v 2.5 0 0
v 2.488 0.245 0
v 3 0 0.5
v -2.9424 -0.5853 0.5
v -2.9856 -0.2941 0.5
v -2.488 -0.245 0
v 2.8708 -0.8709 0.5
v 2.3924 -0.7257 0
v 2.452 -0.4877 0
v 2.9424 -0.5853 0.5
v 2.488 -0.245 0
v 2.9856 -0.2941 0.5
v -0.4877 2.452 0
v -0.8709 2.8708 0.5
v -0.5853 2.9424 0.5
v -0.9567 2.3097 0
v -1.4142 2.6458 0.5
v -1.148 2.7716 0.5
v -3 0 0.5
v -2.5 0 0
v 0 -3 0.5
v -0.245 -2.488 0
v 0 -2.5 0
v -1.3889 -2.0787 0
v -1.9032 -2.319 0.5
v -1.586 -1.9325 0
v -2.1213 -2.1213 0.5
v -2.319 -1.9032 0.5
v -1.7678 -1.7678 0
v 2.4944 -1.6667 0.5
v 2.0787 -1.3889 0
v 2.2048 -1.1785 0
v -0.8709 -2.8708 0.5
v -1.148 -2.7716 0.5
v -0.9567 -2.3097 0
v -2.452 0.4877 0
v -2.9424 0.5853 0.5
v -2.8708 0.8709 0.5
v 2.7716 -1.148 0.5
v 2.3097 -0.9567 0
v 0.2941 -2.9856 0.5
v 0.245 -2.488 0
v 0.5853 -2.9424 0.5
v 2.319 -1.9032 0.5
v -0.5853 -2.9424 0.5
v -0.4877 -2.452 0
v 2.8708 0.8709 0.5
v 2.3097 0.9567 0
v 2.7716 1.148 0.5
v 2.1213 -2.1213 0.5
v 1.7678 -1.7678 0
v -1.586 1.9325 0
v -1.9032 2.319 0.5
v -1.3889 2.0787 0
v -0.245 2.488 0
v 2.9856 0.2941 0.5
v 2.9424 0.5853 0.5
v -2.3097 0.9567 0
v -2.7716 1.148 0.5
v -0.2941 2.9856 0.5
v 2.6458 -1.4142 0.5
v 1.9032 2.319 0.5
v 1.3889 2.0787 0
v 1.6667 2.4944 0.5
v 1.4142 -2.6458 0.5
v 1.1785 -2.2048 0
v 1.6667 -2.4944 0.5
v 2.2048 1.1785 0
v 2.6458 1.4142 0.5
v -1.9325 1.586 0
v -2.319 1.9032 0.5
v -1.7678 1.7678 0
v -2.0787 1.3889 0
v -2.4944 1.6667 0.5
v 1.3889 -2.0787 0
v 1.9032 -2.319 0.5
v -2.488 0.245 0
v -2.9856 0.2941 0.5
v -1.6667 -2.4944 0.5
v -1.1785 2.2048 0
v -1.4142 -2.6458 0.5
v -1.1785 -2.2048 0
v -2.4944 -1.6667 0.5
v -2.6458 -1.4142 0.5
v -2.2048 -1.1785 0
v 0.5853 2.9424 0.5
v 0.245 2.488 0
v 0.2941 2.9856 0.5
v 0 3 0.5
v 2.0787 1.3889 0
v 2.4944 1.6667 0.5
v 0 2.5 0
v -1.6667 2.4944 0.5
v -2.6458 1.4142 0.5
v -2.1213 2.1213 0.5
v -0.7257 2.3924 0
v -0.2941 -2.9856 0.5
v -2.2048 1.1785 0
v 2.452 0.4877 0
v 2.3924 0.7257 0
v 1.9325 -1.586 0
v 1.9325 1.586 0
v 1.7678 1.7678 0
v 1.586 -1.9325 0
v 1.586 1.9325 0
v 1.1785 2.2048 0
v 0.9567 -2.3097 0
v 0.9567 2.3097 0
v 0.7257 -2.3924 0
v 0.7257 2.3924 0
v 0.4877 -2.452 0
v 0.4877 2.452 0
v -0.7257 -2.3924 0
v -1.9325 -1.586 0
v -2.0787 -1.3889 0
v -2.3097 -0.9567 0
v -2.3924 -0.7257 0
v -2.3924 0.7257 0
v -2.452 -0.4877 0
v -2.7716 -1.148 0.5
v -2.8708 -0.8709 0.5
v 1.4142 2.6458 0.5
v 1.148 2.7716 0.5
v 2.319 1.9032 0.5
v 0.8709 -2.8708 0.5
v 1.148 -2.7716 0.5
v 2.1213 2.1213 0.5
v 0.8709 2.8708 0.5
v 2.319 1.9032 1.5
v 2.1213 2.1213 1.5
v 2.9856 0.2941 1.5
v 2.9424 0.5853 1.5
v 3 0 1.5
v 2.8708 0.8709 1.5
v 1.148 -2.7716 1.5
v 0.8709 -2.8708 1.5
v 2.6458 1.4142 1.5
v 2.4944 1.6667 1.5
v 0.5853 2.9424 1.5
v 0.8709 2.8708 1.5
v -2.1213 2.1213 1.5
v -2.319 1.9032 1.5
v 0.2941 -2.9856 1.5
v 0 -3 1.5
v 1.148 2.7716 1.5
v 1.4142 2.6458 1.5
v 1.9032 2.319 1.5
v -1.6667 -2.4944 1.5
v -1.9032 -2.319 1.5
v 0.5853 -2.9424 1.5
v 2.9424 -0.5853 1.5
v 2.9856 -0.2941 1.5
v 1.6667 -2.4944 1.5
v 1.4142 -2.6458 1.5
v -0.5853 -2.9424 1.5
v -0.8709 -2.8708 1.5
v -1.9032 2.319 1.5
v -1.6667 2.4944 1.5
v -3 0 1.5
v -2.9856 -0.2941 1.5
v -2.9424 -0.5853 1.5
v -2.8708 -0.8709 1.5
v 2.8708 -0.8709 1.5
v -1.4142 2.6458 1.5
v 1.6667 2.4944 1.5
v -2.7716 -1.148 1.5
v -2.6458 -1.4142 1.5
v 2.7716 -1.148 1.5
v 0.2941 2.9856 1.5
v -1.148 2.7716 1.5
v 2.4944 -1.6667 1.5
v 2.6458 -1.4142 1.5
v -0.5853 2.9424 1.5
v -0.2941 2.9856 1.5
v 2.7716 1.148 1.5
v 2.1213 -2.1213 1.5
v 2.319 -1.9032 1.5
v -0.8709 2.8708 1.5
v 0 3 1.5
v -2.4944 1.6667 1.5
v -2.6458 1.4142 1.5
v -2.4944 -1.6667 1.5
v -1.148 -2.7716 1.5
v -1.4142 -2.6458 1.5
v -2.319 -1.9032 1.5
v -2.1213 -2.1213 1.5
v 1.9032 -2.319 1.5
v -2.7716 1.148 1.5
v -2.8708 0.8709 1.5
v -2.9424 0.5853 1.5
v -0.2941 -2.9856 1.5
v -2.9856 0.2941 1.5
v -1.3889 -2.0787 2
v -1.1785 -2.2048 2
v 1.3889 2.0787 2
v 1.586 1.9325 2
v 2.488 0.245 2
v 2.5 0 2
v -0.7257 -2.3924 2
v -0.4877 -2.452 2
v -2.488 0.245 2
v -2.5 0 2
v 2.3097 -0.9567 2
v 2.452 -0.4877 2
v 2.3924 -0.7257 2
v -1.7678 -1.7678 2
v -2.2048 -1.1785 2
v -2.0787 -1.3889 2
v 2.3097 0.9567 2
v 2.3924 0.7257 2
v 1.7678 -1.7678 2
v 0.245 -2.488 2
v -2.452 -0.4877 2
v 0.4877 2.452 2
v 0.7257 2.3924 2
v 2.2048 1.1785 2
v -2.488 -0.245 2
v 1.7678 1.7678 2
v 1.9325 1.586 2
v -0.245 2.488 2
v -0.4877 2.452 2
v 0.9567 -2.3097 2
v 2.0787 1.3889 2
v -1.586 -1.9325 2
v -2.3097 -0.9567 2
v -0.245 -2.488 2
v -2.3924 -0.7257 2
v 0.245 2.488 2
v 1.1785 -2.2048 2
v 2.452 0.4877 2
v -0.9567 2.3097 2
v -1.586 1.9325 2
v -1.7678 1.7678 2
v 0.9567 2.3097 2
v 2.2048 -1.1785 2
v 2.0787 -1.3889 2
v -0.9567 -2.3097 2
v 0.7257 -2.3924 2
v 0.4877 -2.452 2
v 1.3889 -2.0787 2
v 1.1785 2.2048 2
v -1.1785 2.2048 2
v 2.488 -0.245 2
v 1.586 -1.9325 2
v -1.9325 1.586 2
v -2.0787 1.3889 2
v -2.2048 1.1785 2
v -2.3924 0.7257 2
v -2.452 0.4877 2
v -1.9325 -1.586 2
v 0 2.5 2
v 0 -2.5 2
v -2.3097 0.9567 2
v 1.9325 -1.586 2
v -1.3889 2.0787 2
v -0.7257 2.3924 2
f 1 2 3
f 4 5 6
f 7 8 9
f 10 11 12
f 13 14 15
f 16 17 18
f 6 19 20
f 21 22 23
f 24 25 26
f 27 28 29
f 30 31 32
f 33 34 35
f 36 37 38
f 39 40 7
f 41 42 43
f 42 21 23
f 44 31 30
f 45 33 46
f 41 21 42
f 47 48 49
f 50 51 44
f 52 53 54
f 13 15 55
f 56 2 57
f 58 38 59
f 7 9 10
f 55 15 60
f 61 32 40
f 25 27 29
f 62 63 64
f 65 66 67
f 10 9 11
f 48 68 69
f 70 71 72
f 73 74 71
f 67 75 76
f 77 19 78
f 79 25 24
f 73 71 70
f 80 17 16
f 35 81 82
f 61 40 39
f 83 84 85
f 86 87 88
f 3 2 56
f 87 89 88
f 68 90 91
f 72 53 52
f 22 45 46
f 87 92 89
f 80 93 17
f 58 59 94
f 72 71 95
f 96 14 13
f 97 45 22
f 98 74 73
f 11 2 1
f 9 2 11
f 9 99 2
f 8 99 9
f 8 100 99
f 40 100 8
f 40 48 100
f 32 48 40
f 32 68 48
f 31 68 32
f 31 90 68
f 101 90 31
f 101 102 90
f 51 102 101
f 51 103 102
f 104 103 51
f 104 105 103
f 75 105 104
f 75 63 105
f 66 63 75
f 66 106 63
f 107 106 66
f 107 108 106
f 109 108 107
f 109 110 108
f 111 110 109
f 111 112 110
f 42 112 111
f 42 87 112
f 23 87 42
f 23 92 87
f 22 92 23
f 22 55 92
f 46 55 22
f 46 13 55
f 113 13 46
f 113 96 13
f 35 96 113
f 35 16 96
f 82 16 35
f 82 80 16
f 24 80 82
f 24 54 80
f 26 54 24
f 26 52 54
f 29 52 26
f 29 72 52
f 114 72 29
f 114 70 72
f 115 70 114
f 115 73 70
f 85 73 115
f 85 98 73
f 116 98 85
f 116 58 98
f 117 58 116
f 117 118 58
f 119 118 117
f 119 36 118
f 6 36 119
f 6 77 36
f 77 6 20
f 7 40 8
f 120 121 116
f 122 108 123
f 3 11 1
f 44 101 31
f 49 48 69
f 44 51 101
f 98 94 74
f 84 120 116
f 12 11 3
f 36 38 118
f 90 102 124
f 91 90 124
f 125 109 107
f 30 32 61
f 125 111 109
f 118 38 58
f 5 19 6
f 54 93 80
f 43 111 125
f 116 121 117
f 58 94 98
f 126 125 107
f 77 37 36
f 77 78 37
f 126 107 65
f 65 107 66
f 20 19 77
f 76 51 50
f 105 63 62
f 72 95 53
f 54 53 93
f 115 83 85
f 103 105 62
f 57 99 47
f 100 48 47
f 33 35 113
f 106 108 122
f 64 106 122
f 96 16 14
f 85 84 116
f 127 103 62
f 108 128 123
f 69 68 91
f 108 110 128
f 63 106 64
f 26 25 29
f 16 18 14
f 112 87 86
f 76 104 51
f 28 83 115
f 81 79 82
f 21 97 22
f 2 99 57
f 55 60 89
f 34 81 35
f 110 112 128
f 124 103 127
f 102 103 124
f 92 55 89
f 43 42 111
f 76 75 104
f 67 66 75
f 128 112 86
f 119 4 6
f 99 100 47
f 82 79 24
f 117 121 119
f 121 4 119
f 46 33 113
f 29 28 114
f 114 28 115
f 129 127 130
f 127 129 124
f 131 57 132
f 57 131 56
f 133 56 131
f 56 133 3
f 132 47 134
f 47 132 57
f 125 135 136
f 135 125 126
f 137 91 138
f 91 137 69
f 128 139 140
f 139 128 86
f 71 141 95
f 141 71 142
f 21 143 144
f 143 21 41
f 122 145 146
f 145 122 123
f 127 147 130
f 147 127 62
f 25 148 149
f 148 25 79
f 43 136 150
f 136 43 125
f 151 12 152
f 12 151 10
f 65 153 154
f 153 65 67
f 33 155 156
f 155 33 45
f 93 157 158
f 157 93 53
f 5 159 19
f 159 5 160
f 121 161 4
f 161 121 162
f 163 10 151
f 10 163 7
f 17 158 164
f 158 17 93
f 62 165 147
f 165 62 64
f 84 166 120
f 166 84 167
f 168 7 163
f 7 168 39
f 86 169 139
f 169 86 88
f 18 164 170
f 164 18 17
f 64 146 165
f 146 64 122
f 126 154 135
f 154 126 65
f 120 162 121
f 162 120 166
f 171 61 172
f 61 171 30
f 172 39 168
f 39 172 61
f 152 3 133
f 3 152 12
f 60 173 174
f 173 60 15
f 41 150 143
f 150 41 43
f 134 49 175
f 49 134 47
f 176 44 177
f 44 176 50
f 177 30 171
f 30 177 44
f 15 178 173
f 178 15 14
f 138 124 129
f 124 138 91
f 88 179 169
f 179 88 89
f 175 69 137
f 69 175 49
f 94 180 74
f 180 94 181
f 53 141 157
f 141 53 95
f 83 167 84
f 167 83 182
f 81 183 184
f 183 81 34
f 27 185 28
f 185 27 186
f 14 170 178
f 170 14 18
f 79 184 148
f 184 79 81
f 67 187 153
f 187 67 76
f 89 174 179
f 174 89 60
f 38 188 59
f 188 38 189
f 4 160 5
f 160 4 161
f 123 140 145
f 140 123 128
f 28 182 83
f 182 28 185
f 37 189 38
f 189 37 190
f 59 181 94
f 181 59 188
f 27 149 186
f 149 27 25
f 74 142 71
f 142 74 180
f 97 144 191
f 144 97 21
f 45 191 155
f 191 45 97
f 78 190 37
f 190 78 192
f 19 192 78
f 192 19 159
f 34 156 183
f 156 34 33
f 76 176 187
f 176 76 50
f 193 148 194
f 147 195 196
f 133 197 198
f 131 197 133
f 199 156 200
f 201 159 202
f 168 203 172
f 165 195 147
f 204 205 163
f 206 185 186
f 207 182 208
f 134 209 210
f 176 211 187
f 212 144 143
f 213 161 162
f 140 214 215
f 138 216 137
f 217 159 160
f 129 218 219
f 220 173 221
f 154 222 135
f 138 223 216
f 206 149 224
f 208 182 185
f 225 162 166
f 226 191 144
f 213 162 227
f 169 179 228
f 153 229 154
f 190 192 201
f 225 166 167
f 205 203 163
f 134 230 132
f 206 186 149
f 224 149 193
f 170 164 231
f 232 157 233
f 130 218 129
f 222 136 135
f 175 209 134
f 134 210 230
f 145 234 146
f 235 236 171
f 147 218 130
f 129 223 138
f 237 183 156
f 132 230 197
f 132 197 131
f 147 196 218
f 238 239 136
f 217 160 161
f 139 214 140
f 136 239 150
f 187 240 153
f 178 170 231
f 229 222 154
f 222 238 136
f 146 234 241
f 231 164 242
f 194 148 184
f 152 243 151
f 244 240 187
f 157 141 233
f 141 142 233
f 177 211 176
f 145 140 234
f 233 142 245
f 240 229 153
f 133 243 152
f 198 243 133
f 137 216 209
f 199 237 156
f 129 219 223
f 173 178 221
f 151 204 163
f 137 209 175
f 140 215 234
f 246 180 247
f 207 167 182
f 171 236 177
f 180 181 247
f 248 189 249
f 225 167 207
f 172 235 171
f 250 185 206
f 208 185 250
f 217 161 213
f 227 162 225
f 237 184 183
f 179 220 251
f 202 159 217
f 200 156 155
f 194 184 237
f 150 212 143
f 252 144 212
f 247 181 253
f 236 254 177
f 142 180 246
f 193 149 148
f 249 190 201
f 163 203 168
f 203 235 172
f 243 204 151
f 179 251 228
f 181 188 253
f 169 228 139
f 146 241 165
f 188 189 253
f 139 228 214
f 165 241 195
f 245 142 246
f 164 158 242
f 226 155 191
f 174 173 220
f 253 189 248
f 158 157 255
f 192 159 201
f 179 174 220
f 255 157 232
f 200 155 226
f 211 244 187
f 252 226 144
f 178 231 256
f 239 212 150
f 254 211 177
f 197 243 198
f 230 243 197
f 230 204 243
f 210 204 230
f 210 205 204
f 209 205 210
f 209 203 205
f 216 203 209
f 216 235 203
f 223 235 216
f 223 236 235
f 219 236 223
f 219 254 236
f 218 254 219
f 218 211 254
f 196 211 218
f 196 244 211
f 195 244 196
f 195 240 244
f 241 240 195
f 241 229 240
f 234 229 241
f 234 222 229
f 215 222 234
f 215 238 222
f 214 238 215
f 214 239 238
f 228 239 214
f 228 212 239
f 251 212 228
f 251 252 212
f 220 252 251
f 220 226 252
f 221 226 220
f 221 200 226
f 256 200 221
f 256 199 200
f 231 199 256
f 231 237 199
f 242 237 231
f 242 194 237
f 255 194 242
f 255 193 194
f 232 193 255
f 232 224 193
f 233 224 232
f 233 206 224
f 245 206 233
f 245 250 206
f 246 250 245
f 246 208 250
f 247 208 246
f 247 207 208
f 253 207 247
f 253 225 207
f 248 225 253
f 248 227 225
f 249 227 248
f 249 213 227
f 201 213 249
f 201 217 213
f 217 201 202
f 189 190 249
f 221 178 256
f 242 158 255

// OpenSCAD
$fn=64;
union(){
    cylinder(0.5,2.5,3);
    translate([0,0,0.5]){
        cylinder(1,3,3);
    }
    translate([0,0,1.5]){
        cylinder(0.5,3,2.5);
    }
}
